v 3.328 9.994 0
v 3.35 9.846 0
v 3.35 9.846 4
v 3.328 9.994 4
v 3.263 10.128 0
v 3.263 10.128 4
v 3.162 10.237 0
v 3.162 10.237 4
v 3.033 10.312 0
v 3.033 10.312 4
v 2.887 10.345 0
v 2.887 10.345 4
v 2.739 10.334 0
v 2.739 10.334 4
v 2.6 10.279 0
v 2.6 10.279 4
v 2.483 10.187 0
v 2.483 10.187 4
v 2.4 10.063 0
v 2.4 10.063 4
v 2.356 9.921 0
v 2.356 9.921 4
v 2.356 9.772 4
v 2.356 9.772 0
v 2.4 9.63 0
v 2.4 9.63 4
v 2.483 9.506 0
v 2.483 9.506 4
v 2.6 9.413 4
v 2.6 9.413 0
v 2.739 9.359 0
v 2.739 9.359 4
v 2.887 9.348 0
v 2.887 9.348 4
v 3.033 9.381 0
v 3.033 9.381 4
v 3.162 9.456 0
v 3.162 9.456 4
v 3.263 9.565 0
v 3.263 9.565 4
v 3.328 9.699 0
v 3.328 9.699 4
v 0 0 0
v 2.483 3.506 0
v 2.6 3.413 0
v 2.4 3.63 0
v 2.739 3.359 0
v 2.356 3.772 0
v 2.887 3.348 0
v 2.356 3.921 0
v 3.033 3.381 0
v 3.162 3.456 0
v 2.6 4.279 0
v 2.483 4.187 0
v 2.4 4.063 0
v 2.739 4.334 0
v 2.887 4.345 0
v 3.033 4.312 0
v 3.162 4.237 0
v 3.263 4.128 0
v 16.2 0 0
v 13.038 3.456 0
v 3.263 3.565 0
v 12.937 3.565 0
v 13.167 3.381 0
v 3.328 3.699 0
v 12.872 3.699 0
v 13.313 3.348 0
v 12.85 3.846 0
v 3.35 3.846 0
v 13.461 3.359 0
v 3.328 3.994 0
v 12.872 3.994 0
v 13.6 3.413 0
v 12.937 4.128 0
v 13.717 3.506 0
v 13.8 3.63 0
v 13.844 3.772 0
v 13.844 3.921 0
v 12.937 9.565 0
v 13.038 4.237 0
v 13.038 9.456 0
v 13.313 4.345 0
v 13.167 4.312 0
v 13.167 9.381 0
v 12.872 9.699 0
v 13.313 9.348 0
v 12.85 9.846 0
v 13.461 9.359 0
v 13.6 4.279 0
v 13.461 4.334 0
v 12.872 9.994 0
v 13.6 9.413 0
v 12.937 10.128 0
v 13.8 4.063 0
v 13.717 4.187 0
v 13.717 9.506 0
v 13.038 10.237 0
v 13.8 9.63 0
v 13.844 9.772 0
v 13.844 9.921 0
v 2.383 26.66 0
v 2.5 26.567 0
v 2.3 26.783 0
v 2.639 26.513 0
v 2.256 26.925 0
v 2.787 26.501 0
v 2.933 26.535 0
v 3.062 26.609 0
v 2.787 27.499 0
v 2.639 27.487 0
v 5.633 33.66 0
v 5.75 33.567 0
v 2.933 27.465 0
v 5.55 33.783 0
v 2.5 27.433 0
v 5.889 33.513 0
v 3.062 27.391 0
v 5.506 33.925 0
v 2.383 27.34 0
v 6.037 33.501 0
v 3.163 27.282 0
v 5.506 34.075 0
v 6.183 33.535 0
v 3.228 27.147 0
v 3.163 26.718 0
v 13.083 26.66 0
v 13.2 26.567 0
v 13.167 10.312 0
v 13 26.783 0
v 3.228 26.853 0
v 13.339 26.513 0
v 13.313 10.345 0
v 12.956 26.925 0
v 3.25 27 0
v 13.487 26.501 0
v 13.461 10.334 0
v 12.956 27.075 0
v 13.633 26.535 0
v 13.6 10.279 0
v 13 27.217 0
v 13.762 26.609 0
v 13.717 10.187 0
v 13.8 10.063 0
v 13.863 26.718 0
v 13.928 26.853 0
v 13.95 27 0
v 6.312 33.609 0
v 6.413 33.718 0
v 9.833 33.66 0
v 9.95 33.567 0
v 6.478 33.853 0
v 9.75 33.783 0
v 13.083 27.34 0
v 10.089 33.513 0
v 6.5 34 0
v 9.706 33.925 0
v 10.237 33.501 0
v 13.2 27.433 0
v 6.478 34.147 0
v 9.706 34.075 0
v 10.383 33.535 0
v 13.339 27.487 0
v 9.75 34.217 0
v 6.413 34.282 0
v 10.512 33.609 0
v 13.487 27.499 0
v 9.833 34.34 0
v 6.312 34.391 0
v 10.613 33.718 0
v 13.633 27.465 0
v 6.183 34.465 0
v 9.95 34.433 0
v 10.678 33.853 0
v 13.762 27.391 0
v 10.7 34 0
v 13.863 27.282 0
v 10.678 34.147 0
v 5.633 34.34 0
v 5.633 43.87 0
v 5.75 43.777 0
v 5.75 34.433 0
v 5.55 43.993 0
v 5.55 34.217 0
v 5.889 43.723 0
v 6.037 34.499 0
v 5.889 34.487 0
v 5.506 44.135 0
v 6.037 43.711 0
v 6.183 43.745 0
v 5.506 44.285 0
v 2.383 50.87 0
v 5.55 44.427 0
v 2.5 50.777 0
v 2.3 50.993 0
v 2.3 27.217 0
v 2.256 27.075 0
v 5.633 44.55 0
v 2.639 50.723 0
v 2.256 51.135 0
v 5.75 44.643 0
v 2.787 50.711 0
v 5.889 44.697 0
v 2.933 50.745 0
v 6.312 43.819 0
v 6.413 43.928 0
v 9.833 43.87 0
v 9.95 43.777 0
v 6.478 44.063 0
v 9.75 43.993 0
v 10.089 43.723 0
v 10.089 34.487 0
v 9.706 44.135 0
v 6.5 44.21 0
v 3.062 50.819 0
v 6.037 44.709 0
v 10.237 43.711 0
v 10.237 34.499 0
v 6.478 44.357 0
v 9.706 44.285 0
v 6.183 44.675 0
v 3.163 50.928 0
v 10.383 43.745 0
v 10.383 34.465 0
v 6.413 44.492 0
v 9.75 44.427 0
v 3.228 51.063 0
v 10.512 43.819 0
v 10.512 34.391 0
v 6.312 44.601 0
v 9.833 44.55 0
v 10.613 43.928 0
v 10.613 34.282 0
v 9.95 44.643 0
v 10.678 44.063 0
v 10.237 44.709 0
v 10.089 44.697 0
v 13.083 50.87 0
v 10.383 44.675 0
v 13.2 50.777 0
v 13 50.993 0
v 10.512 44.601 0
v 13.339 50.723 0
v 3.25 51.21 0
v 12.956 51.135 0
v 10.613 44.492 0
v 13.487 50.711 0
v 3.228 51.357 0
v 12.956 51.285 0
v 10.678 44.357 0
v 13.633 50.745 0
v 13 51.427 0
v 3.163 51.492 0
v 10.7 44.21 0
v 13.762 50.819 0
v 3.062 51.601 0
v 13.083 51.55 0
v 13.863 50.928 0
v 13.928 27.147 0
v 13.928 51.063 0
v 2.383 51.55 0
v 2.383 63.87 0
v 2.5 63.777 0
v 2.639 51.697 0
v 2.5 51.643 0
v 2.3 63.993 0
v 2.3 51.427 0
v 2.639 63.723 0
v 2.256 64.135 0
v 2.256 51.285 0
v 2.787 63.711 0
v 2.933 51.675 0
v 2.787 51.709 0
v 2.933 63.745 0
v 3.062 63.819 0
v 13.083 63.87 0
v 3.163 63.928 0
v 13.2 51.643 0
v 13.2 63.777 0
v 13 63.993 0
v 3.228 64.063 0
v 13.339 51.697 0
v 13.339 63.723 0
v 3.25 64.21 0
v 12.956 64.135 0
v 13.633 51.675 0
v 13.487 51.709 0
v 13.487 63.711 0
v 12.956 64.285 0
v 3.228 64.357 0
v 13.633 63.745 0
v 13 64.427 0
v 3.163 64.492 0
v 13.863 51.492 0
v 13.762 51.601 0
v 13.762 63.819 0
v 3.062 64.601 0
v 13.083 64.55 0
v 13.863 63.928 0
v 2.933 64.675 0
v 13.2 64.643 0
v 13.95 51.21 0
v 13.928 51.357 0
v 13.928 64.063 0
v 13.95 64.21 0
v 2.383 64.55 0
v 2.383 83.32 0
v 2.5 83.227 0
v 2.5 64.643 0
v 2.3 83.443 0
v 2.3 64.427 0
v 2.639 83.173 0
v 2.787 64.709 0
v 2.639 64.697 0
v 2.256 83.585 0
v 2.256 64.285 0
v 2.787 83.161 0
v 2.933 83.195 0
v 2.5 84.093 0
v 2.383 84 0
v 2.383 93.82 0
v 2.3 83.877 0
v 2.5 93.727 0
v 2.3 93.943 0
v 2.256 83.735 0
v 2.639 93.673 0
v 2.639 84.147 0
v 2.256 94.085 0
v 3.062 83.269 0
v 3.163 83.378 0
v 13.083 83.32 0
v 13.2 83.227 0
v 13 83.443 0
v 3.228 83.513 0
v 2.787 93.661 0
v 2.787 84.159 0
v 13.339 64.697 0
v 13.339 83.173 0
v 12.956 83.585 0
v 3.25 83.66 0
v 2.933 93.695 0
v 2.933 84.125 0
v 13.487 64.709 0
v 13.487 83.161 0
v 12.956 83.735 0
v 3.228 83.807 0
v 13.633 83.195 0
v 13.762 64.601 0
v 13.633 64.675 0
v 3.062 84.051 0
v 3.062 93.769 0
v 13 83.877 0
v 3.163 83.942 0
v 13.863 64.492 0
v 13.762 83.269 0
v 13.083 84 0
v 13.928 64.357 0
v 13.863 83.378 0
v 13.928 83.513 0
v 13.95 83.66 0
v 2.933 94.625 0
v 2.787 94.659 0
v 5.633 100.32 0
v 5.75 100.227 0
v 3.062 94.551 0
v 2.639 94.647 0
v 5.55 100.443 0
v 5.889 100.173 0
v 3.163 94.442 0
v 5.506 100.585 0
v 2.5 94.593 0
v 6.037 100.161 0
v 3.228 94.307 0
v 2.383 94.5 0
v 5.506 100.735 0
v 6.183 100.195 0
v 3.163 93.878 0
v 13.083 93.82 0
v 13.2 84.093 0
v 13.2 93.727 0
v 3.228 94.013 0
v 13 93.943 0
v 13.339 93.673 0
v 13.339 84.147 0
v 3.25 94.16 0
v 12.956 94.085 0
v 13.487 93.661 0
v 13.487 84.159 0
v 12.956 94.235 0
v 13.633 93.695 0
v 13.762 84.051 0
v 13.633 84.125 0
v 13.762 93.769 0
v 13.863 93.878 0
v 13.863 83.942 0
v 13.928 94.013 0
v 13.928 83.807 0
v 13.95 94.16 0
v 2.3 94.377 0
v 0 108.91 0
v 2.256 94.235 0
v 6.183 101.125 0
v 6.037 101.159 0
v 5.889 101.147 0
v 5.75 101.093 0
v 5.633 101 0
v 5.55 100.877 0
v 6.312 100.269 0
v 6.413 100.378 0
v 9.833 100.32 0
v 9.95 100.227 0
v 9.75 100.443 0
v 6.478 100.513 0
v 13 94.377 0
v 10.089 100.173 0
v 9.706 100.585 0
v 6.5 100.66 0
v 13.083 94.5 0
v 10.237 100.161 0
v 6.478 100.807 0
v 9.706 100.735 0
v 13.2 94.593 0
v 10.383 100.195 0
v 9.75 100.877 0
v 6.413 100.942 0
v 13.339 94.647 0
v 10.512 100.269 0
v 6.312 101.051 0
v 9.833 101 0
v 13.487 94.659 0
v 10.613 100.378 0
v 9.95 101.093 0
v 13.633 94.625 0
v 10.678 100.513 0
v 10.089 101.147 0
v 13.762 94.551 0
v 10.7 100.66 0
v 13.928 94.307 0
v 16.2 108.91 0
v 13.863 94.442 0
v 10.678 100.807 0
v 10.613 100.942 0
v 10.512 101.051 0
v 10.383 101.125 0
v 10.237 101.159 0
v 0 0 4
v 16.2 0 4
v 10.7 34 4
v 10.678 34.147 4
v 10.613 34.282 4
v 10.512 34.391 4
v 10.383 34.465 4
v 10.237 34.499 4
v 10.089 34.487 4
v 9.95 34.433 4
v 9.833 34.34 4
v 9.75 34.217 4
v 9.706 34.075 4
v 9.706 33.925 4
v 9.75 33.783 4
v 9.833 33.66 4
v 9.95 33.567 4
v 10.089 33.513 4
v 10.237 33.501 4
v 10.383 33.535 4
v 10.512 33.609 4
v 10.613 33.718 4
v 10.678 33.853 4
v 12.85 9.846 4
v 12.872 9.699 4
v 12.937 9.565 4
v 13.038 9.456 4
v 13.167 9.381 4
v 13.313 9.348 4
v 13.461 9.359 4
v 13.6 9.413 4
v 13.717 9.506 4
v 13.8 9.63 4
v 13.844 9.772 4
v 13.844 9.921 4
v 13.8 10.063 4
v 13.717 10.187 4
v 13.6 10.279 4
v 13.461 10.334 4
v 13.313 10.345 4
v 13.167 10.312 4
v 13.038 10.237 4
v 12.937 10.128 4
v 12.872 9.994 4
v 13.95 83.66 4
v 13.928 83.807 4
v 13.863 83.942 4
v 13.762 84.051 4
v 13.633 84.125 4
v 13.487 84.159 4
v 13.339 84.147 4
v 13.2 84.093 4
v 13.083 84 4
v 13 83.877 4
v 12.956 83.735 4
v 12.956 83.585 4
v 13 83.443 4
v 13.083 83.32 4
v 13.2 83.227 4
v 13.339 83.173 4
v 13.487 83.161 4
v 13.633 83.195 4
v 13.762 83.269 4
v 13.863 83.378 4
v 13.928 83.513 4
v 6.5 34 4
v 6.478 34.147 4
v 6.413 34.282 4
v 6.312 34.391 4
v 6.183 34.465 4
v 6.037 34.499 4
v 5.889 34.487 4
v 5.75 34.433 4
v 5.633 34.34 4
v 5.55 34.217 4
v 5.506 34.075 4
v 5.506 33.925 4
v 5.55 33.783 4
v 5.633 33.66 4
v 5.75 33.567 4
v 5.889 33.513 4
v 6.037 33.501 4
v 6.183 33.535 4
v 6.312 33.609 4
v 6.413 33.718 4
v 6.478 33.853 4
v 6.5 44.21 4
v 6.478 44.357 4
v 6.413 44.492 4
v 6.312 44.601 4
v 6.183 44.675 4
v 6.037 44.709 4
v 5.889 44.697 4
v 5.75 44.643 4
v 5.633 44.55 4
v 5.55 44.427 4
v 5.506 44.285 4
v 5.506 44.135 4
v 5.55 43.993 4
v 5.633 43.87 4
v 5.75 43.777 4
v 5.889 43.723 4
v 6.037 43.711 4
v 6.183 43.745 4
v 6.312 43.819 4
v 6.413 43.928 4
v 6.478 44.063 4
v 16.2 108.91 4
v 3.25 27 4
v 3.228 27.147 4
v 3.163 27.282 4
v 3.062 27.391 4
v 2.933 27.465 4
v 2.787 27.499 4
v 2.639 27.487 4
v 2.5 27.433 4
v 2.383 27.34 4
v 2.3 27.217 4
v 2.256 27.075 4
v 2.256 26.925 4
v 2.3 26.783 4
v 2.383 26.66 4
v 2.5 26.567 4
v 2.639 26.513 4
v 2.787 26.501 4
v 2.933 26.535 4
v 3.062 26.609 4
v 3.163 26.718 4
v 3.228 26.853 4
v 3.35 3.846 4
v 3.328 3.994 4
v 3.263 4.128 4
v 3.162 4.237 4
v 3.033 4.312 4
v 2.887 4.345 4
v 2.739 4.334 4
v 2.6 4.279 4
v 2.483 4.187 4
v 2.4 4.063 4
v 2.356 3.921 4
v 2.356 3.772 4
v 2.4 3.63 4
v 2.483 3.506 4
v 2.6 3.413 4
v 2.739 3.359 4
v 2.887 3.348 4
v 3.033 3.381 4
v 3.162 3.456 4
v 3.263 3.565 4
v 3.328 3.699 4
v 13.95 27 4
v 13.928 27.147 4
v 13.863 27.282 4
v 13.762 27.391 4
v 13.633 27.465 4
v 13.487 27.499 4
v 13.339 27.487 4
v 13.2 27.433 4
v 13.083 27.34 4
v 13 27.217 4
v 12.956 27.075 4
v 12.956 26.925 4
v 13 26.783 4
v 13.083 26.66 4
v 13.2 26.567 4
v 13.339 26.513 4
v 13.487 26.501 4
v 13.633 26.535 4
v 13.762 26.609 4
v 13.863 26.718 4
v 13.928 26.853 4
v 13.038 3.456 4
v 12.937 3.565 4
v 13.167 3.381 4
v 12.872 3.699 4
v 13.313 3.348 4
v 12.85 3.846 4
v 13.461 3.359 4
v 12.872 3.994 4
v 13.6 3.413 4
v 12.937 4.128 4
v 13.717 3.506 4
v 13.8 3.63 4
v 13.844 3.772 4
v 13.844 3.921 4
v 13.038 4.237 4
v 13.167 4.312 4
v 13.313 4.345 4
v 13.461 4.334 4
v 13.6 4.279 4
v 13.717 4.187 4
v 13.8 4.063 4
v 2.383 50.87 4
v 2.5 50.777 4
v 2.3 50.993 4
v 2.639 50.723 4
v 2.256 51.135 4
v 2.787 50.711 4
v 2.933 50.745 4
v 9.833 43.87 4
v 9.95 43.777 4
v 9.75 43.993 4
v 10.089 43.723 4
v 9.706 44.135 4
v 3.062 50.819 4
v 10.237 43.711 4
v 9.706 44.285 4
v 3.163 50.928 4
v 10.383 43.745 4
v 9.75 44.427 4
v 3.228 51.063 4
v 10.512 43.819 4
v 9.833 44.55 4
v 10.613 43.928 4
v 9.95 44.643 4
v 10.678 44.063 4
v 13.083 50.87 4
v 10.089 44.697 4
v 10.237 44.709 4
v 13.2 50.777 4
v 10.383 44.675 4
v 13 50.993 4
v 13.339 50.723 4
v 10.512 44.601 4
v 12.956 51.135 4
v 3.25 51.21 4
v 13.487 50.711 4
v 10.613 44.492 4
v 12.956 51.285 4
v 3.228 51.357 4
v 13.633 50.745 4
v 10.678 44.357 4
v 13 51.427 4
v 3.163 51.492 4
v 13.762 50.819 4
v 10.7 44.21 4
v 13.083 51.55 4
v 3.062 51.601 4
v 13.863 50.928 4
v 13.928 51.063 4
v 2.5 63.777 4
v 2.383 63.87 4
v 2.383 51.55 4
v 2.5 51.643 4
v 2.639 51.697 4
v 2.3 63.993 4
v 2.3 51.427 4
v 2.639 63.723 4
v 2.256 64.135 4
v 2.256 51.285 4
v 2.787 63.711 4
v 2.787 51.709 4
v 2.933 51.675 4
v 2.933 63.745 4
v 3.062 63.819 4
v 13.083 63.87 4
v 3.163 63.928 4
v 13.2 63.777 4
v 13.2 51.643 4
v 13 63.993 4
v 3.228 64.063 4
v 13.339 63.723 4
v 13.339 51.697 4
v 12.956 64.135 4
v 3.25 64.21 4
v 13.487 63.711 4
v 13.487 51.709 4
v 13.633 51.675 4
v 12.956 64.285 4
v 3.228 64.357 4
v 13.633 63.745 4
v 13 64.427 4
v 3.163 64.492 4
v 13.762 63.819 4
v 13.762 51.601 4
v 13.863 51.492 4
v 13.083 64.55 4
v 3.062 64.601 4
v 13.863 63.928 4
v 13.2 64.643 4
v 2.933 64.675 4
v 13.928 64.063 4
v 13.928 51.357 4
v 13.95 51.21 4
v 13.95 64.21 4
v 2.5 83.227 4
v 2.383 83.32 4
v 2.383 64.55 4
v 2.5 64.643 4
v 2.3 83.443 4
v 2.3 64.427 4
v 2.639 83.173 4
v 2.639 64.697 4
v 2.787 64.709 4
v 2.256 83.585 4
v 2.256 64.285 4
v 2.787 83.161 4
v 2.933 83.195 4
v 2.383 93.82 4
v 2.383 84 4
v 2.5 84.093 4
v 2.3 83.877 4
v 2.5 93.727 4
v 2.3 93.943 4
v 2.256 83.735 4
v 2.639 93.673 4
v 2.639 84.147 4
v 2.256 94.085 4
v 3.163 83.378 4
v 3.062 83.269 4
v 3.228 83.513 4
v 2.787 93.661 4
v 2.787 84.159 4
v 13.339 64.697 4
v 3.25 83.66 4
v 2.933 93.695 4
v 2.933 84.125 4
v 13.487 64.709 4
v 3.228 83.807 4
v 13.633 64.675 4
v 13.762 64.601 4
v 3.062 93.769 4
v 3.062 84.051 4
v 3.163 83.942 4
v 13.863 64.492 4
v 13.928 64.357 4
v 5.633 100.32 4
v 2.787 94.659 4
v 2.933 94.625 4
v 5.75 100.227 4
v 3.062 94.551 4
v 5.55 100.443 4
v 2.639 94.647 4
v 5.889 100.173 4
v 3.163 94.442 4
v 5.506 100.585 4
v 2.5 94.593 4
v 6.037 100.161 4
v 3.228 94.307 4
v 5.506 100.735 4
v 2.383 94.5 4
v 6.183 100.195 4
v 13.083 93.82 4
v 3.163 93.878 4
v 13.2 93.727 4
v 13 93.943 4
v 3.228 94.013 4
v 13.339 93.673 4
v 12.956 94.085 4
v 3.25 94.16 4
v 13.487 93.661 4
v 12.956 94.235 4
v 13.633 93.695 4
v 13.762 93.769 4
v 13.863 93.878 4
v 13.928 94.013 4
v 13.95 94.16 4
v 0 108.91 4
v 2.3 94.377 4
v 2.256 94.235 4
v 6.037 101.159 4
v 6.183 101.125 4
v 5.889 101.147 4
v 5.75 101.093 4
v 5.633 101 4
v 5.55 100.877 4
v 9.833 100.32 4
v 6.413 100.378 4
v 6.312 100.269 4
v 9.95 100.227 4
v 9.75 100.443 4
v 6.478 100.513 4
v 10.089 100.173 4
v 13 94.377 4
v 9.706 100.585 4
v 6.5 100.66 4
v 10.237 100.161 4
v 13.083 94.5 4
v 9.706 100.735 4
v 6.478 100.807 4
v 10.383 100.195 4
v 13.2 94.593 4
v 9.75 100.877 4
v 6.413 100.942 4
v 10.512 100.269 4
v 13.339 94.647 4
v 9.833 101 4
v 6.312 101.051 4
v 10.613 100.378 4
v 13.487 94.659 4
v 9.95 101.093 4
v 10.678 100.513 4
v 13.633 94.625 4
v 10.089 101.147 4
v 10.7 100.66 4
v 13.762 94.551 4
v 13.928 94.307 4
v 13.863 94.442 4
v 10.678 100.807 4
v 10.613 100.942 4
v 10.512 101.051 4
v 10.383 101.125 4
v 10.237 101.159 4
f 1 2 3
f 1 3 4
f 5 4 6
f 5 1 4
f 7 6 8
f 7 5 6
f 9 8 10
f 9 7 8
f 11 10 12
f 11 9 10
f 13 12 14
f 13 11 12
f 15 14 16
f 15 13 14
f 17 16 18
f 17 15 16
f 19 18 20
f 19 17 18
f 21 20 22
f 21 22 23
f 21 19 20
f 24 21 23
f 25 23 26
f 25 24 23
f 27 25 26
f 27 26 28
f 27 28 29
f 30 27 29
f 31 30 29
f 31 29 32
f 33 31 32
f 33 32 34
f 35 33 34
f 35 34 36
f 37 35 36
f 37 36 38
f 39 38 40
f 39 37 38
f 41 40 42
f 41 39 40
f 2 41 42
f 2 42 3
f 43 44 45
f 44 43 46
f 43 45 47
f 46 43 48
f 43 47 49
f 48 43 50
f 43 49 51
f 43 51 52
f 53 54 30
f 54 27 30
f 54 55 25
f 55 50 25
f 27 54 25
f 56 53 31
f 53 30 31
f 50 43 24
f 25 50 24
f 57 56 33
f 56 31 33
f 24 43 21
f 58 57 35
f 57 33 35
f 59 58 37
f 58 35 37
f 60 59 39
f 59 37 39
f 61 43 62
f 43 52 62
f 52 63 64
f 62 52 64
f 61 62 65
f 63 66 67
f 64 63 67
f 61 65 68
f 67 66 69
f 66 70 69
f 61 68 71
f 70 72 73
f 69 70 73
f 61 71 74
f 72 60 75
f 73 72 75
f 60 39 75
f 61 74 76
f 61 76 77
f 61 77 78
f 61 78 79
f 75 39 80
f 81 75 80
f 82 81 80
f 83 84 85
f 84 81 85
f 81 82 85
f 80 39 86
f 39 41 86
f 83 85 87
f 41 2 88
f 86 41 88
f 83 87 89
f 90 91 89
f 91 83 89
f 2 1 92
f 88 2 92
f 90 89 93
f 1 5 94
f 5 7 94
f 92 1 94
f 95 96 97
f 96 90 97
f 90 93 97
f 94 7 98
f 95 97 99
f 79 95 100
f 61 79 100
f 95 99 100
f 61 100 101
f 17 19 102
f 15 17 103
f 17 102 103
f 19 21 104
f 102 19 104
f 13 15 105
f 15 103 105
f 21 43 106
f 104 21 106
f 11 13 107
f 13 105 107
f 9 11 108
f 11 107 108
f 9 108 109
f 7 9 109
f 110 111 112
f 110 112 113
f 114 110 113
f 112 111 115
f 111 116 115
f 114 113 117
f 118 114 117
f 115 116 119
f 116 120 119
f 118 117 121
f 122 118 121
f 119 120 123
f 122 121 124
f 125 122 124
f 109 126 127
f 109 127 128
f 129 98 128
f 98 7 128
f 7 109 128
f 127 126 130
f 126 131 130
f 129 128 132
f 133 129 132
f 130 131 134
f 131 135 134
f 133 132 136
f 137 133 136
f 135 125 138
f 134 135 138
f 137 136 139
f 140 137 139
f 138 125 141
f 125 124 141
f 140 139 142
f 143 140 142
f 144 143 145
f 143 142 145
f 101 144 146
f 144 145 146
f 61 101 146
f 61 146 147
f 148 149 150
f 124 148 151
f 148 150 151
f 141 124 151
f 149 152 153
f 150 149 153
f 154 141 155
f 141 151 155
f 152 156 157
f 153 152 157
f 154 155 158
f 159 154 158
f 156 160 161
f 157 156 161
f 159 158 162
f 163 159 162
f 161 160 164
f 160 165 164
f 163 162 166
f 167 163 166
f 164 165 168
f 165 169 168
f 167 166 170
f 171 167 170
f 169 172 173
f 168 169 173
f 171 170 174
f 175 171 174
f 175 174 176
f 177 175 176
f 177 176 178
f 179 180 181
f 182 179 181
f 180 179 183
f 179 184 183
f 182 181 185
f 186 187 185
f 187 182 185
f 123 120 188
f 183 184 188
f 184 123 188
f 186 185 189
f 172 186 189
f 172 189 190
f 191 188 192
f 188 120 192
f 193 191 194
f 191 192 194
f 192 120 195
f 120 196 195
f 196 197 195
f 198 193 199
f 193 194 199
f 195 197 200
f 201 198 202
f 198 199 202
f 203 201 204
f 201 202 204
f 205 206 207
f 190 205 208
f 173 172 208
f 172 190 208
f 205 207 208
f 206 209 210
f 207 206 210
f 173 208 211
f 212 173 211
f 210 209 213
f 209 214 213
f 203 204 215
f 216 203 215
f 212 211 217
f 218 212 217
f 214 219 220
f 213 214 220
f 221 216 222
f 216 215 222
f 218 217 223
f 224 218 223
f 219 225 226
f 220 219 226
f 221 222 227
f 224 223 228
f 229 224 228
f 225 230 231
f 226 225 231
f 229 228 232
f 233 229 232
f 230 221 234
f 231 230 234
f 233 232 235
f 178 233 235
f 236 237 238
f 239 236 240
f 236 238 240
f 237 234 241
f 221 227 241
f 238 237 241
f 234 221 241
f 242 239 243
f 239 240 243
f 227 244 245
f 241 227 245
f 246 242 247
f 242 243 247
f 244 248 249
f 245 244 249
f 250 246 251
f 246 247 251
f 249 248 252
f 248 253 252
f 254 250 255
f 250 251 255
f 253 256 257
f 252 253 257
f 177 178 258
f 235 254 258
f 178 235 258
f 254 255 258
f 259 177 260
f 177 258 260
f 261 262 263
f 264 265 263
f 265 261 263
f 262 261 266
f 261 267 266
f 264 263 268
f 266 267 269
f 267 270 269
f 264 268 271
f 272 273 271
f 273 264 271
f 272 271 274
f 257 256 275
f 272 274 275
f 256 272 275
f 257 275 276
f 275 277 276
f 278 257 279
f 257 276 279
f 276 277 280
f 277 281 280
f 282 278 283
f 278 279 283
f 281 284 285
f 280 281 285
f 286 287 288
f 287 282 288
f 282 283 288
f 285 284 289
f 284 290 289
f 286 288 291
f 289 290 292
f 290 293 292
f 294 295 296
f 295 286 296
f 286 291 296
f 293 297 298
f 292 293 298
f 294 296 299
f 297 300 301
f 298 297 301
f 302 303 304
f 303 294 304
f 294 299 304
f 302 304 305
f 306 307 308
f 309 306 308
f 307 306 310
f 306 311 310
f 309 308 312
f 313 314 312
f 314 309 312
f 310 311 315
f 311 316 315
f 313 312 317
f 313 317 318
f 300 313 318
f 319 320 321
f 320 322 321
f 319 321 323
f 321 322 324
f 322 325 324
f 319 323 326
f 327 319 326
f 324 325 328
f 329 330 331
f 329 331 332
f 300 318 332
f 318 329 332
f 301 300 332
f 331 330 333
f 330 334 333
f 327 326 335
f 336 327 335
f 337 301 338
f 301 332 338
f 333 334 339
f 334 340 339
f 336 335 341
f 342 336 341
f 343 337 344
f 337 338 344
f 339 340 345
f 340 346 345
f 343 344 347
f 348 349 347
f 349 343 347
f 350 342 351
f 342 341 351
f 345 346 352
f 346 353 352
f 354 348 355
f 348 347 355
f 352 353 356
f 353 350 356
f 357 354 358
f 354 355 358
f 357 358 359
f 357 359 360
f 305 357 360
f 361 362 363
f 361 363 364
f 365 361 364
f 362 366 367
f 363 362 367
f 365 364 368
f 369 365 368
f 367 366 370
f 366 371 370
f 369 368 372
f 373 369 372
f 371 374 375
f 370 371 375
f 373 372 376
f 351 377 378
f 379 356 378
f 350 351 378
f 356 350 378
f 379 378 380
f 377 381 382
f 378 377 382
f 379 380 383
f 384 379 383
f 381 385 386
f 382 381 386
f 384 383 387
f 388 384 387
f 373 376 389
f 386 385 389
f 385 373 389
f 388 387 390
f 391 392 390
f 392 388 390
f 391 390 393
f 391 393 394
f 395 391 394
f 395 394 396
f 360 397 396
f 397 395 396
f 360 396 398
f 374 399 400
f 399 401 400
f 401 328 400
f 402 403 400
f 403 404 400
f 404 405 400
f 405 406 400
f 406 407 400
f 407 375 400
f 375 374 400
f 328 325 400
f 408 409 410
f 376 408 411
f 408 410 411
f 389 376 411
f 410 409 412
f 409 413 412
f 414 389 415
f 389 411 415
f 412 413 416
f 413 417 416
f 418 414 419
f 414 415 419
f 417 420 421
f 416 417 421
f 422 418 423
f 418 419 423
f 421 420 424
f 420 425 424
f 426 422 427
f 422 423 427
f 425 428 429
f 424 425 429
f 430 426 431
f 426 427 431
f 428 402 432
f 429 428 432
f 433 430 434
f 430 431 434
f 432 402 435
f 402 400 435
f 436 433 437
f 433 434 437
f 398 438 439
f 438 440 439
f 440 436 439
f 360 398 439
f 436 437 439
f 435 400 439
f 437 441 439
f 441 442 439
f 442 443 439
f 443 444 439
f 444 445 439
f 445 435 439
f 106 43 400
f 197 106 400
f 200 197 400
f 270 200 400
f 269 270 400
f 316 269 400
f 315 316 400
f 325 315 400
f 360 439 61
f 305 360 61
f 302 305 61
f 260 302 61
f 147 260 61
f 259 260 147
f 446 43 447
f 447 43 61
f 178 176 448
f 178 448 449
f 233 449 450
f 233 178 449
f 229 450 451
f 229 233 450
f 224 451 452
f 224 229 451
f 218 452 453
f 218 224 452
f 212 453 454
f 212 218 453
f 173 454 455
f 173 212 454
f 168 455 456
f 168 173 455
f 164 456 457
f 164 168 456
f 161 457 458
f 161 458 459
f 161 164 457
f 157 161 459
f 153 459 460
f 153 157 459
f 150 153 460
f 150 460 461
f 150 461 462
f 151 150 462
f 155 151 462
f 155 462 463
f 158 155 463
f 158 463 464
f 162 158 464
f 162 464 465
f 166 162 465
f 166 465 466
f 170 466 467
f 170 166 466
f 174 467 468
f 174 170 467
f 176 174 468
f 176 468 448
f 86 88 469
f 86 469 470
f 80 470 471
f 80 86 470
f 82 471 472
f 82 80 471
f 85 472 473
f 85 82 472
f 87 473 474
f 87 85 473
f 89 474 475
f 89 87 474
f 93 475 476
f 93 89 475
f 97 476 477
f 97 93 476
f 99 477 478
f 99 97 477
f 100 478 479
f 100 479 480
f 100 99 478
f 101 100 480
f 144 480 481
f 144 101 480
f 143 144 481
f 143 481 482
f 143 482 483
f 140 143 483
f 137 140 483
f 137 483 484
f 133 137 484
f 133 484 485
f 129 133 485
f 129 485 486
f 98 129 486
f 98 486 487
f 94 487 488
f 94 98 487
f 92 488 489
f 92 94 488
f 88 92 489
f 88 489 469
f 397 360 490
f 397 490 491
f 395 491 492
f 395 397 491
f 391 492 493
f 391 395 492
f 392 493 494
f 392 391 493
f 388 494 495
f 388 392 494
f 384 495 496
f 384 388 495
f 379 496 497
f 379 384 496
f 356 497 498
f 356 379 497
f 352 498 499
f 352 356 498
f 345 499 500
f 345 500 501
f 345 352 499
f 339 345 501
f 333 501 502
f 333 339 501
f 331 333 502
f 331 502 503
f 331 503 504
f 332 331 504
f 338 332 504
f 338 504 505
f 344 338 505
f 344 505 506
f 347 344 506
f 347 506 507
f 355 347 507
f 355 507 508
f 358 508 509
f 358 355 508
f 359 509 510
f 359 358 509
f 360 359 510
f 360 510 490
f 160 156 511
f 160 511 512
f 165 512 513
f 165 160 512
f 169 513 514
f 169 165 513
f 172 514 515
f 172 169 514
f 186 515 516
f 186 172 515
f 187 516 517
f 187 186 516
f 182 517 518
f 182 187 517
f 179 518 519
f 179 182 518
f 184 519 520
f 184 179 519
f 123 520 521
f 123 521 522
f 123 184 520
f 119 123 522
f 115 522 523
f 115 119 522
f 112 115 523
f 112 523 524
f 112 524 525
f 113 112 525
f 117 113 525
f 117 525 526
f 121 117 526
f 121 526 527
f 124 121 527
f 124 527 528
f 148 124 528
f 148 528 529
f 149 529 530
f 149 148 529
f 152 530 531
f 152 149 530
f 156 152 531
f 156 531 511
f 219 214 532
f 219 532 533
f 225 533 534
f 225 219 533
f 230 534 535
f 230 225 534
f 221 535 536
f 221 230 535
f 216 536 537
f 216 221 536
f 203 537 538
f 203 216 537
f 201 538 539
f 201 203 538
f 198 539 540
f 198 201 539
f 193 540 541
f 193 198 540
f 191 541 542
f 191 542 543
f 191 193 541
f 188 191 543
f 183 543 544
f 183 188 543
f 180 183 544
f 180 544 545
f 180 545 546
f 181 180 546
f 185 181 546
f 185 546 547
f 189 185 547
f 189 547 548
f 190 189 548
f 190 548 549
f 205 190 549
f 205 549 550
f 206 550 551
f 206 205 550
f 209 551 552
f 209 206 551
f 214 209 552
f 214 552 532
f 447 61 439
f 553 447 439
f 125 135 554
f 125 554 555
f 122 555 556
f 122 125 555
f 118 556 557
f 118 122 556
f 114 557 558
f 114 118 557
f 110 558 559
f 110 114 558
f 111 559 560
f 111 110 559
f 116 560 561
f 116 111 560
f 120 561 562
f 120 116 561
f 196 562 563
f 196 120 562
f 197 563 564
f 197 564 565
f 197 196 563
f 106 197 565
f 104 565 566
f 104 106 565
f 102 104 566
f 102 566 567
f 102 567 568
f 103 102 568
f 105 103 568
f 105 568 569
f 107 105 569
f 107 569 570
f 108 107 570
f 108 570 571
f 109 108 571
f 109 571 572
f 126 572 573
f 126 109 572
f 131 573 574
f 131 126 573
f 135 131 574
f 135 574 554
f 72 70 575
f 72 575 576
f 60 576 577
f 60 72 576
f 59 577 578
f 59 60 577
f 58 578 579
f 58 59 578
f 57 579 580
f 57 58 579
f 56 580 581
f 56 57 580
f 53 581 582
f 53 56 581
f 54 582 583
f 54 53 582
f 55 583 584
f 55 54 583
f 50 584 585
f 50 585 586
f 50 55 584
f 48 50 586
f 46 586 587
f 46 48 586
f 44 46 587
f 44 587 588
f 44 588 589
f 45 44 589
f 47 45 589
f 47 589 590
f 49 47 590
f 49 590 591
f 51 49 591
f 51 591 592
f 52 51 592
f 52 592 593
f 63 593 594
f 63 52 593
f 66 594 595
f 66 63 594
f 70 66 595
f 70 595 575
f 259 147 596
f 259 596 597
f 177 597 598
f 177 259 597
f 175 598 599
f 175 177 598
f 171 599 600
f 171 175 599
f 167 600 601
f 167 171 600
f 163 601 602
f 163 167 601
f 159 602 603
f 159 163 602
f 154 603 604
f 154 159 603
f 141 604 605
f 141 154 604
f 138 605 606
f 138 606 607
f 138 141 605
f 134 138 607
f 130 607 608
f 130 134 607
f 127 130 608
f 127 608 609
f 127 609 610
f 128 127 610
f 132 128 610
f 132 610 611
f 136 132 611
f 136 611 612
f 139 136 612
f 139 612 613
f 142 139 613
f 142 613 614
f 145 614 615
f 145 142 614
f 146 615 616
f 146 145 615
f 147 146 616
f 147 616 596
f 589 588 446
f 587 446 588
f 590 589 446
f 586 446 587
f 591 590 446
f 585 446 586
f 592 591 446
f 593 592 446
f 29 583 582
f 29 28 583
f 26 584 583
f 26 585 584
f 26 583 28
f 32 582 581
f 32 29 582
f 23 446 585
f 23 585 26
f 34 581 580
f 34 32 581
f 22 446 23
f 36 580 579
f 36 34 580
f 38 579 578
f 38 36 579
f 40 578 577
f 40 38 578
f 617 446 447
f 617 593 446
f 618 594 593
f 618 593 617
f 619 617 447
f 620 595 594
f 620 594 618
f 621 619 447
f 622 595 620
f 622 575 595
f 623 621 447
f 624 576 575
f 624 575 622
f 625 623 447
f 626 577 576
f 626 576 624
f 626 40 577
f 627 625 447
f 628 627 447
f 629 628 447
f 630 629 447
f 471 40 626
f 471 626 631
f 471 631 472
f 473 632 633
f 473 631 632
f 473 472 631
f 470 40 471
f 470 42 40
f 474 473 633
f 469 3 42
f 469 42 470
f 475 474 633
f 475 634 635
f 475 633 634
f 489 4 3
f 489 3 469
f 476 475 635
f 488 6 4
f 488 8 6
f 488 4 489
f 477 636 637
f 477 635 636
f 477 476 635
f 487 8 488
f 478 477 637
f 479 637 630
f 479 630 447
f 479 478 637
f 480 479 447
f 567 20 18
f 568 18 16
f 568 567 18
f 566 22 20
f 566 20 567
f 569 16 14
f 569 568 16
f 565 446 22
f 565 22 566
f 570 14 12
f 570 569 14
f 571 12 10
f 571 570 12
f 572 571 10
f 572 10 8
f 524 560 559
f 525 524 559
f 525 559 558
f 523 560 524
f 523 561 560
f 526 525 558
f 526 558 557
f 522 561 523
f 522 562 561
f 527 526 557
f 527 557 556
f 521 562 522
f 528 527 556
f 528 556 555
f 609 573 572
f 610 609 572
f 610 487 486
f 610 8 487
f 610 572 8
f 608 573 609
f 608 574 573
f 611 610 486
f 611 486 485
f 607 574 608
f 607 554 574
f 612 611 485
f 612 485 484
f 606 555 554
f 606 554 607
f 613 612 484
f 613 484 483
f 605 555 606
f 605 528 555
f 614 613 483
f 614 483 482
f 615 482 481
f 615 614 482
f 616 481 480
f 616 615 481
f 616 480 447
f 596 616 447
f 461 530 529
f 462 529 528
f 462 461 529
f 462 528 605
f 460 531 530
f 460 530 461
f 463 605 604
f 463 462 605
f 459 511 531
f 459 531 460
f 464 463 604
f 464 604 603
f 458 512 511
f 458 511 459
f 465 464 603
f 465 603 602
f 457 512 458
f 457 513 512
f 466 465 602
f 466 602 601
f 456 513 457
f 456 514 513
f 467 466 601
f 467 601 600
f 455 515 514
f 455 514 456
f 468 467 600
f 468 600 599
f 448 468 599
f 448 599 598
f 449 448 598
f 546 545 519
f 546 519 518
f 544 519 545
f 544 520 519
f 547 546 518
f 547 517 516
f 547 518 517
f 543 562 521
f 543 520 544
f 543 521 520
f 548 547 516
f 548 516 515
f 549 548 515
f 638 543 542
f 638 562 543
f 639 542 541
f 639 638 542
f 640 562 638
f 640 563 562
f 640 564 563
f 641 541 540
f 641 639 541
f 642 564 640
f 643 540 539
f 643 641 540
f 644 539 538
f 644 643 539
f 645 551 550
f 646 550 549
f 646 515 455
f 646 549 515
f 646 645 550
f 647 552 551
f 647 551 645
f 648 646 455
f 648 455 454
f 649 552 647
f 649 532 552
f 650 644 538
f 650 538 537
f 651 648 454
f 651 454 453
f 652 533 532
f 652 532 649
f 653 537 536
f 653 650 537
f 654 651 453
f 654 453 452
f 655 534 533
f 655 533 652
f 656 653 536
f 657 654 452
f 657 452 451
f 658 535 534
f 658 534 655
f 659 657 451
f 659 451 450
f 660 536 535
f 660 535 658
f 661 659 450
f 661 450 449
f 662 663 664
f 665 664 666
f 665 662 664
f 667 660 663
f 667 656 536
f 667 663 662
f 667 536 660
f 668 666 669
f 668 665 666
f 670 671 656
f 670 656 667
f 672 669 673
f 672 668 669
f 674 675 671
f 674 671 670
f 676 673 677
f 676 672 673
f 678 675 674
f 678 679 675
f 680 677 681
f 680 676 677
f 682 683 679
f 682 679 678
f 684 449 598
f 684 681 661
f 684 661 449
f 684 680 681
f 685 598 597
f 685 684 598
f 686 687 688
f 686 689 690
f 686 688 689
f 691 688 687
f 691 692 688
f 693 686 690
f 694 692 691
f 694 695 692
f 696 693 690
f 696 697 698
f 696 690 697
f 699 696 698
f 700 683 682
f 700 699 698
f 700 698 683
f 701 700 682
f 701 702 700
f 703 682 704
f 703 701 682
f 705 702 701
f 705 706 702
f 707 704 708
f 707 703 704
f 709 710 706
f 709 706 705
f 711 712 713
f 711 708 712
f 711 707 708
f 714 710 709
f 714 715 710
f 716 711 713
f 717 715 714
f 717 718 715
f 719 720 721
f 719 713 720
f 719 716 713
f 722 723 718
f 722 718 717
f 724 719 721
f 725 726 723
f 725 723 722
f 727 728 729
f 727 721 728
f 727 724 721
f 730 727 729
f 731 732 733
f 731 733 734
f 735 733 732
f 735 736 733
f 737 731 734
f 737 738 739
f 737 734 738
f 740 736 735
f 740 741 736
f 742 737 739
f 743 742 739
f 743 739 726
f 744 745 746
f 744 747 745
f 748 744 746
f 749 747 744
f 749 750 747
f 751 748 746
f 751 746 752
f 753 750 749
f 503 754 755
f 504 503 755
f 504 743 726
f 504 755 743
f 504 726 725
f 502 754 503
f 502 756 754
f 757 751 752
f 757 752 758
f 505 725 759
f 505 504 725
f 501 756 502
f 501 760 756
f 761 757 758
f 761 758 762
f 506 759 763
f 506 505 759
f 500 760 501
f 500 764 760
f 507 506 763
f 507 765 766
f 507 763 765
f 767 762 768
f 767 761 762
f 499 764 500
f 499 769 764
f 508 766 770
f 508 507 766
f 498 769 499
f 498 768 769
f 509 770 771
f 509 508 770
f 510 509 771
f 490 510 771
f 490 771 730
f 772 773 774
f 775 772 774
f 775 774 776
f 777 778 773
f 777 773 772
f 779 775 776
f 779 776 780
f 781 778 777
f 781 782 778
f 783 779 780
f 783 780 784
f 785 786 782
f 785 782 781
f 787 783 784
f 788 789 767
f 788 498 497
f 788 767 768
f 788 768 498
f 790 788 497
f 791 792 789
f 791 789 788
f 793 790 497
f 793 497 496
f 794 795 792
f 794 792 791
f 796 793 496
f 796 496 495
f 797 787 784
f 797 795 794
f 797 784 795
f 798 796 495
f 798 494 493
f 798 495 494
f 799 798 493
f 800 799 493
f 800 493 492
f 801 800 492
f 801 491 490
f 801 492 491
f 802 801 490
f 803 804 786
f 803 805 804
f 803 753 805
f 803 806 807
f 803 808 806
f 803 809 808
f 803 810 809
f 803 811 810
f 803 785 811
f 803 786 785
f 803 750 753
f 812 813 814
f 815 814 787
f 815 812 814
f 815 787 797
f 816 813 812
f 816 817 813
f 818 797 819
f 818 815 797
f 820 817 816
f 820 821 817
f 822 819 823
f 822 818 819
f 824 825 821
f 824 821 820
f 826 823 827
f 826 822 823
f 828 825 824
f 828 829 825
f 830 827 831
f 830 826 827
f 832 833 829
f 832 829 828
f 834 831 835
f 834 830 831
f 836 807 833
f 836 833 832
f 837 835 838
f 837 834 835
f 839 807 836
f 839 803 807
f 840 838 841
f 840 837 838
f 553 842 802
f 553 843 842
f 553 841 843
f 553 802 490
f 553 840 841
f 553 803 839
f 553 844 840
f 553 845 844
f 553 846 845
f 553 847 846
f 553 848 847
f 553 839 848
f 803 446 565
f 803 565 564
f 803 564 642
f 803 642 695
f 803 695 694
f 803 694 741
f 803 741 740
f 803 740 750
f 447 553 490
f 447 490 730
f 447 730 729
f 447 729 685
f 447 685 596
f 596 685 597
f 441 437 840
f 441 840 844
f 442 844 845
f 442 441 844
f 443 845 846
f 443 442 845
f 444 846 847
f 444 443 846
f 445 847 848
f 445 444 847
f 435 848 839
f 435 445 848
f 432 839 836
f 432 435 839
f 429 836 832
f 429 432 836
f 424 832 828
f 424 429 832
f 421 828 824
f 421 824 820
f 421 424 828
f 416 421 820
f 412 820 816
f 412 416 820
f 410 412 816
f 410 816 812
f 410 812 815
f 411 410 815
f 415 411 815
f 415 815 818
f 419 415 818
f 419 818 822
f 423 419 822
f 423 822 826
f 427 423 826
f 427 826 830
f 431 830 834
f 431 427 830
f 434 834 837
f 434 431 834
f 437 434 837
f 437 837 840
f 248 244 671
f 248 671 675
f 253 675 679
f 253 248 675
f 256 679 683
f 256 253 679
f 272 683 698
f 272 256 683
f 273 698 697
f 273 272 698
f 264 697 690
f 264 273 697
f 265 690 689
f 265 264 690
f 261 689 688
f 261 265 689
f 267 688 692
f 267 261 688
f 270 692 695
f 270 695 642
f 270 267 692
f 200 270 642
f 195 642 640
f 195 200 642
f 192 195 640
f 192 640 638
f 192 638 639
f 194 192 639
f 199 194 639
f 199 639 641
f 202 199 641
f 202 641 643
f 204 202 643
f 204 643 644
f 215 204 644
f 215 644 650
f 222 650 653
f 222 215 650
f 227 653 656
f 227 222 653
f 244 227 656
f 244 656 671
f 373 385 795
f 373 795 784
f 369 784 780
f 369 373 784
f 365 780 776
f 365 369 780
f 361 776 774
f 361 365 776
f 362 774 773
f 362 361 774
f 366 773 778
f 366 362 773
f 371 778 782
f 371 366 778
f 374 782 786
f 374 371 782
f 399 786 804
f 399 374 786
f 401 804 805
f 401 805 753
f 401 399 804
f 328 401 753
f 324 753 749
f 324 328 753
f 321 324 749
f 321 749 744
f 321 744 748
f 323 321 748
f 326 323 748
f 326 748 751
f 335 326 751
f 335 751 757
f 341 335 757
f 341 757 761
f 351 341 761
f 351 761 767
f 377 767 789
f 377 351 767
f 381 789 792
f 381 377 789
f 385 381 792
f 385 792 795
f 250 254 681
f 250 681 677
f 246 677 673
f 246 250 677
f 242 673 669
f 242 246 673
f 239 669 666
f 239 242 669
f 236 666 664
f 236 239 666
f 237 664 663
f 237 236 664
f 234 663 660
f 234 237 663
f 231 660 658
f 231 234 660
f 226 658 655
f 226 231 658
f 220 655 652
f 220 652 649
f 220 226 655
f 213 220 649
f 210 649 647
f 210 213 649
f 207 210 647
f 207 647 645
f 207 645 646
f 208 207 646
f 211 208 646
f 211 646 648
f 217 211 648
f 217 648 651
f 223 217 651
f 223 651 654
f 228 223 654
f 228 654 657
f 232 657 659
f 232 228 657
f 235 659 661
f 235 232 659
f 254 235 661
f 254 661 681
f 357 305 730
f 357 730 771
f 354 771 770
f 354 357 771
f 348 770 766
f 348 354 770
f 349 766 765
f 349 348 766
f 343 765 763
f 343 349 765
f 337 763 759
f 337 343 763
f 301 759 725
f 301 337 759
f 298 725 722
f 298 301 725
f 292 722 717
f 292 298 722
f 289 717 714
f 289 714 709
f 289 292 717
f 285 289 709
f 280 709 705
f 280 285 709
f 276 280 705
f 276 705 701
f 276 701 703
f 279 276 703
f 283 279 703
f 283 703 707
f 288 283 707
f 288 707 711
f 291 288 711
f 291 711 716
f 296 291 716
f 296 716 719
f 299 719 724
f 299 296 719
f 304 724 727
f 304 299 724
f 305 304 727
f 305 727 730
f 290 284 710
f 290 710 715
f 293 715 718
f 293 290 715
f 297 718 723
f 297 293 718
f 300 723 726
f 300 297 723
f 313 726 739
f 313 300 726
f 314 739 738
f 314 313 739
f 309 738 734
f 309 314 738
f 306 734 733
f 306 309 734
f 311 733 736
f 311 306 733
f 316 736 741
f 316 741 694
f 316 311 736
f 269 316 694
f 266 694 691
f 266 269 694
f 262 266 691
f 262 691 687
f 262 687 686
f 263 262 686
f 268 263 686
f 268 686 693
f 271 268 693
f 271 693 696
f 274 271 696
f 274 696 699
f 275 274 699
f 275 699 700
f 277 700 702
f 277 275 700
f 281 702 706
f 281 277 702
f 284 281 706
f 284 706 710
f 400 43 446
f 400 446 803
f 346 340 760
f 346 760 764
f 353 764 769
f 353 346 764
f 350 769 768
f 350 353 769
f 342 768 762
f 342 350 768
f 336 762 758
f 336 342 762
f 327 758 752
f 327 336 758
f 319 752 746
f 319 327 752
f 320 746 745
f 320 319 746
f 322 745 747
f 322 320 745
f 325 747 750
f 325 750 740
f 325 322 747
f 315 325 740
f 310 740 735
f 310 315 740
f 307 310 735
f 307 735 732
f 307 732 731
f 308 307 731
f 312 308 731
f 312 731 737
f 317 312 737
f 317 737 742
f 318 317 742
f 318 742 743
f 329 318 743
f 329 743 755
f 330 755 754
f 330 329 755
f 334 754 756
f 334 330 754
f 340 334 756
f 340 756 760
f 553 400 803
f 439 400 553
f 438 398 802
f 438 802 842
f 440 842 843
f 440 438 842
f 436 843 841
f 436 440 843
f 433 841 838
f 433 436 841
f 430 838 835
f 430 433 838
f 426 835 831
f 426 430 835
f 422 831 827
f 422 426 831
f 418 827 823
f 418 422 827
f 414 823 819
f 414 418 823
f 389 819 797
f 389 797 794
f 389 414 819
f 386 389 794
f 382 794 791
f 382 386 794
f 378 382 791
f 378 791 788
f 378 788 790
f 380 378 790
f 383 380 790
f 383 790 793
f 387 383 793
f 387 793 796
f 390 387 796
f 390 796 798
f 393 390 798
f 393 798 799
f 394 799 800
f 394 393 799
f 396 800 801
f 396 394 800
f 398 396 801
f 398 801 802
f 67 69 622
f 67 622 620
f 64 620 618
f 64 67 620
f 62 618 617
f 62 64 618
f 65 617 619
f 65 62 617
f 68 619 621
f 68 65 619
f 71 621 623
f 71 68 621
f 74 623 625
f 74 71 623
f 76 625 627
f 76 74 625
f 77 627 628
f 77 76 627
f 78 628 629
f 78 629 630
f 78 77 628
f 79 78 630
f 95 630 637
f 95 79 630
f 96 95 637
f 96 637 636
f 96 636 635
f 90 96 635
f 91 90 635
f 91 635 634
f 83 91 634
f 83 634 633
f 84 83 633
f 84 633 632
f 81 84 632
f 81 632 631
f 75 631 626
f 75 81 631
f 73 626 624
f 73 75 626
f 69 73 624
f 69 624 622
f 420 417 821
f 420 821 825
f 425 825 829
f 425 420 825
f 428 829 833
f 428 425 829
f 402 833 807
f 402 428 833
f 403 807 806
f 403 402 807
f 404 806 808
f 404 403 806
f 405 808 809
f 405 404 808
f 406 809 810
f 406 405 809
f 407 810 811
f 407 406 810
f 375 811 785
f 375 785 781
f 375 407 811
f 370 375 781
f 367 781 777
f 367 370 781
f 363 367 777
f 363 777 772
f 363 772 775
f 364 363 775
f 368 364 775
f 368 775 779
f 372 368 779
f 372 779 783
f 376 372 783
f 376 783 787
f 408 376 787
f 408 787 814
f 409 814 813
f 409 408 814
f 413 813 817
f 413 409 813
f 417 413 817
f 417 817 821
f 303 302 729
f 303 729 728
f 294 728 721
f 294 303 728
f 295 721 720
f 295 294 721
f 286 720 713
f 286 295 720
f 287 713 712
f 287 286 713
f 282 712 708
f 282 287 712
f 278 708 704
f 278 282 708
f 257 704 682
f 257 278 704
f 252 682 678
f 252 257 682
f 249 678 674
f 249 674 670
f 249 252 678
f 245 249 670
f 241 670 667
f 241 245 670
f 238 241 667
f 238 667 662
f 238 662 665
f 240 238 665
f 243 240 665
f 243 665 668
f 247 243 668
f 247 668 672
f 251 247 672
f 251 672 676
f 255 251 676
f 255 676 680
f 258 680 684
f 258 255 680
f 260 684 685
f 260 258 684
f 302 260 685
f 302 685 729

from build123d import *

# Parameters (mm, degrees)
SKETCH1_W           = 16.2
SKETCH1_H           = 108.91
SKETCH1_R           = 0.5
BOSS_EXTRUDE1_DEPTH = 4


with BuildPart() as part:
    # Sketch1 → Boss-Extrude1 (new body)
    with BuildSketch(Plane.XY):
        with Locations((8.1, 54.455)):
            Rectangle(SKETCH1_W, SKETCH1_H)
        with Locations((13.45, 51.21)):
            Circle(SKETCH1_R, mode=Mode.SUBTRACT)
        with Locations((10.2, 44.21)):
            Circle(SKETCH1_R, mode=Mode.SUBTRACT)
        with Locations((10.2, 100.66)):
            Circle(SKETCH1_R, mode=Mode.SUBTRACT)
        with Locations((2.75, 94.16)):
            Circle(SKETCH1_R, mode=Mode.SUBTRACT)
        with Locations((6, 44.21)):
            Circle(SKETCH1_R, mode=Mode.SUBTRACT)
        with Locations((2.75, 27)):
            Circle(SKETCH1_R, mode=Mode.SUBTRACT)
        with Locations((2.75, 83.66)):
            Circle(SKETCH1_R, mode=Mode.SUBTRACT)
        with Locations((2.75, 51.21)):
            Circle(SKETCH1_R, mode=Mode.SUBTRACT)
        with Locations((13.45, 64.21)):
            Circle(SKETCH1_R, mode=Mode.SUBTRACT)
        with Locations((6, 34)):
            Circle(SKETCH1_R, mode=Mode.SUBTRACT)
        with Locations((13.45, 94.16)):
            Circle(SKETCH1_R, mode=Mode.SUBTRACT)
        with Locations((13.45, 83.66)):
            Circle(SKETCH1_R, mode=Mode.SUBTRACT)
        with Locations((6, 100.66)):
            Circle(SKETCH1_R, mode=Mode.SUBTRACT)
        with Locations((10.2, 34)):
            Circle(SKETCH1_R, mode=Mode.SUBTRACT)
        with Locations((2.75, 64.21)):
            Circle(SKETCH1_R, mode=Mode.SUBTRACT)
        with Locations((13.45, 27)):
            Circle(SKETCH1_R, mode=Mode.SUBTRACT)
        with Locations((2.85, 9.846448831)):
            Circle(SKETCH1_R, mode=Mode.SUBTRACT)
        with Locations(Location((13.35, 9.846448831, 0), (0, 0, 180))):
            Circle(SKETCH1_R, mode=Mode.SUBTRACT)
        with Locations(Location((13.35, 3.846448831, 0), (0, 0, 180))):
            Circle(SKETCH1_R, mode=Mode.SUBTRACT)
        with Locations((2.85, 3.846448831)):
            Circle(SKETCH1_R, mode=Mode.SUBTRACT)
    extrude(amount=BOSS_EXTRUDE1_DEPTH)


solid = part.part
